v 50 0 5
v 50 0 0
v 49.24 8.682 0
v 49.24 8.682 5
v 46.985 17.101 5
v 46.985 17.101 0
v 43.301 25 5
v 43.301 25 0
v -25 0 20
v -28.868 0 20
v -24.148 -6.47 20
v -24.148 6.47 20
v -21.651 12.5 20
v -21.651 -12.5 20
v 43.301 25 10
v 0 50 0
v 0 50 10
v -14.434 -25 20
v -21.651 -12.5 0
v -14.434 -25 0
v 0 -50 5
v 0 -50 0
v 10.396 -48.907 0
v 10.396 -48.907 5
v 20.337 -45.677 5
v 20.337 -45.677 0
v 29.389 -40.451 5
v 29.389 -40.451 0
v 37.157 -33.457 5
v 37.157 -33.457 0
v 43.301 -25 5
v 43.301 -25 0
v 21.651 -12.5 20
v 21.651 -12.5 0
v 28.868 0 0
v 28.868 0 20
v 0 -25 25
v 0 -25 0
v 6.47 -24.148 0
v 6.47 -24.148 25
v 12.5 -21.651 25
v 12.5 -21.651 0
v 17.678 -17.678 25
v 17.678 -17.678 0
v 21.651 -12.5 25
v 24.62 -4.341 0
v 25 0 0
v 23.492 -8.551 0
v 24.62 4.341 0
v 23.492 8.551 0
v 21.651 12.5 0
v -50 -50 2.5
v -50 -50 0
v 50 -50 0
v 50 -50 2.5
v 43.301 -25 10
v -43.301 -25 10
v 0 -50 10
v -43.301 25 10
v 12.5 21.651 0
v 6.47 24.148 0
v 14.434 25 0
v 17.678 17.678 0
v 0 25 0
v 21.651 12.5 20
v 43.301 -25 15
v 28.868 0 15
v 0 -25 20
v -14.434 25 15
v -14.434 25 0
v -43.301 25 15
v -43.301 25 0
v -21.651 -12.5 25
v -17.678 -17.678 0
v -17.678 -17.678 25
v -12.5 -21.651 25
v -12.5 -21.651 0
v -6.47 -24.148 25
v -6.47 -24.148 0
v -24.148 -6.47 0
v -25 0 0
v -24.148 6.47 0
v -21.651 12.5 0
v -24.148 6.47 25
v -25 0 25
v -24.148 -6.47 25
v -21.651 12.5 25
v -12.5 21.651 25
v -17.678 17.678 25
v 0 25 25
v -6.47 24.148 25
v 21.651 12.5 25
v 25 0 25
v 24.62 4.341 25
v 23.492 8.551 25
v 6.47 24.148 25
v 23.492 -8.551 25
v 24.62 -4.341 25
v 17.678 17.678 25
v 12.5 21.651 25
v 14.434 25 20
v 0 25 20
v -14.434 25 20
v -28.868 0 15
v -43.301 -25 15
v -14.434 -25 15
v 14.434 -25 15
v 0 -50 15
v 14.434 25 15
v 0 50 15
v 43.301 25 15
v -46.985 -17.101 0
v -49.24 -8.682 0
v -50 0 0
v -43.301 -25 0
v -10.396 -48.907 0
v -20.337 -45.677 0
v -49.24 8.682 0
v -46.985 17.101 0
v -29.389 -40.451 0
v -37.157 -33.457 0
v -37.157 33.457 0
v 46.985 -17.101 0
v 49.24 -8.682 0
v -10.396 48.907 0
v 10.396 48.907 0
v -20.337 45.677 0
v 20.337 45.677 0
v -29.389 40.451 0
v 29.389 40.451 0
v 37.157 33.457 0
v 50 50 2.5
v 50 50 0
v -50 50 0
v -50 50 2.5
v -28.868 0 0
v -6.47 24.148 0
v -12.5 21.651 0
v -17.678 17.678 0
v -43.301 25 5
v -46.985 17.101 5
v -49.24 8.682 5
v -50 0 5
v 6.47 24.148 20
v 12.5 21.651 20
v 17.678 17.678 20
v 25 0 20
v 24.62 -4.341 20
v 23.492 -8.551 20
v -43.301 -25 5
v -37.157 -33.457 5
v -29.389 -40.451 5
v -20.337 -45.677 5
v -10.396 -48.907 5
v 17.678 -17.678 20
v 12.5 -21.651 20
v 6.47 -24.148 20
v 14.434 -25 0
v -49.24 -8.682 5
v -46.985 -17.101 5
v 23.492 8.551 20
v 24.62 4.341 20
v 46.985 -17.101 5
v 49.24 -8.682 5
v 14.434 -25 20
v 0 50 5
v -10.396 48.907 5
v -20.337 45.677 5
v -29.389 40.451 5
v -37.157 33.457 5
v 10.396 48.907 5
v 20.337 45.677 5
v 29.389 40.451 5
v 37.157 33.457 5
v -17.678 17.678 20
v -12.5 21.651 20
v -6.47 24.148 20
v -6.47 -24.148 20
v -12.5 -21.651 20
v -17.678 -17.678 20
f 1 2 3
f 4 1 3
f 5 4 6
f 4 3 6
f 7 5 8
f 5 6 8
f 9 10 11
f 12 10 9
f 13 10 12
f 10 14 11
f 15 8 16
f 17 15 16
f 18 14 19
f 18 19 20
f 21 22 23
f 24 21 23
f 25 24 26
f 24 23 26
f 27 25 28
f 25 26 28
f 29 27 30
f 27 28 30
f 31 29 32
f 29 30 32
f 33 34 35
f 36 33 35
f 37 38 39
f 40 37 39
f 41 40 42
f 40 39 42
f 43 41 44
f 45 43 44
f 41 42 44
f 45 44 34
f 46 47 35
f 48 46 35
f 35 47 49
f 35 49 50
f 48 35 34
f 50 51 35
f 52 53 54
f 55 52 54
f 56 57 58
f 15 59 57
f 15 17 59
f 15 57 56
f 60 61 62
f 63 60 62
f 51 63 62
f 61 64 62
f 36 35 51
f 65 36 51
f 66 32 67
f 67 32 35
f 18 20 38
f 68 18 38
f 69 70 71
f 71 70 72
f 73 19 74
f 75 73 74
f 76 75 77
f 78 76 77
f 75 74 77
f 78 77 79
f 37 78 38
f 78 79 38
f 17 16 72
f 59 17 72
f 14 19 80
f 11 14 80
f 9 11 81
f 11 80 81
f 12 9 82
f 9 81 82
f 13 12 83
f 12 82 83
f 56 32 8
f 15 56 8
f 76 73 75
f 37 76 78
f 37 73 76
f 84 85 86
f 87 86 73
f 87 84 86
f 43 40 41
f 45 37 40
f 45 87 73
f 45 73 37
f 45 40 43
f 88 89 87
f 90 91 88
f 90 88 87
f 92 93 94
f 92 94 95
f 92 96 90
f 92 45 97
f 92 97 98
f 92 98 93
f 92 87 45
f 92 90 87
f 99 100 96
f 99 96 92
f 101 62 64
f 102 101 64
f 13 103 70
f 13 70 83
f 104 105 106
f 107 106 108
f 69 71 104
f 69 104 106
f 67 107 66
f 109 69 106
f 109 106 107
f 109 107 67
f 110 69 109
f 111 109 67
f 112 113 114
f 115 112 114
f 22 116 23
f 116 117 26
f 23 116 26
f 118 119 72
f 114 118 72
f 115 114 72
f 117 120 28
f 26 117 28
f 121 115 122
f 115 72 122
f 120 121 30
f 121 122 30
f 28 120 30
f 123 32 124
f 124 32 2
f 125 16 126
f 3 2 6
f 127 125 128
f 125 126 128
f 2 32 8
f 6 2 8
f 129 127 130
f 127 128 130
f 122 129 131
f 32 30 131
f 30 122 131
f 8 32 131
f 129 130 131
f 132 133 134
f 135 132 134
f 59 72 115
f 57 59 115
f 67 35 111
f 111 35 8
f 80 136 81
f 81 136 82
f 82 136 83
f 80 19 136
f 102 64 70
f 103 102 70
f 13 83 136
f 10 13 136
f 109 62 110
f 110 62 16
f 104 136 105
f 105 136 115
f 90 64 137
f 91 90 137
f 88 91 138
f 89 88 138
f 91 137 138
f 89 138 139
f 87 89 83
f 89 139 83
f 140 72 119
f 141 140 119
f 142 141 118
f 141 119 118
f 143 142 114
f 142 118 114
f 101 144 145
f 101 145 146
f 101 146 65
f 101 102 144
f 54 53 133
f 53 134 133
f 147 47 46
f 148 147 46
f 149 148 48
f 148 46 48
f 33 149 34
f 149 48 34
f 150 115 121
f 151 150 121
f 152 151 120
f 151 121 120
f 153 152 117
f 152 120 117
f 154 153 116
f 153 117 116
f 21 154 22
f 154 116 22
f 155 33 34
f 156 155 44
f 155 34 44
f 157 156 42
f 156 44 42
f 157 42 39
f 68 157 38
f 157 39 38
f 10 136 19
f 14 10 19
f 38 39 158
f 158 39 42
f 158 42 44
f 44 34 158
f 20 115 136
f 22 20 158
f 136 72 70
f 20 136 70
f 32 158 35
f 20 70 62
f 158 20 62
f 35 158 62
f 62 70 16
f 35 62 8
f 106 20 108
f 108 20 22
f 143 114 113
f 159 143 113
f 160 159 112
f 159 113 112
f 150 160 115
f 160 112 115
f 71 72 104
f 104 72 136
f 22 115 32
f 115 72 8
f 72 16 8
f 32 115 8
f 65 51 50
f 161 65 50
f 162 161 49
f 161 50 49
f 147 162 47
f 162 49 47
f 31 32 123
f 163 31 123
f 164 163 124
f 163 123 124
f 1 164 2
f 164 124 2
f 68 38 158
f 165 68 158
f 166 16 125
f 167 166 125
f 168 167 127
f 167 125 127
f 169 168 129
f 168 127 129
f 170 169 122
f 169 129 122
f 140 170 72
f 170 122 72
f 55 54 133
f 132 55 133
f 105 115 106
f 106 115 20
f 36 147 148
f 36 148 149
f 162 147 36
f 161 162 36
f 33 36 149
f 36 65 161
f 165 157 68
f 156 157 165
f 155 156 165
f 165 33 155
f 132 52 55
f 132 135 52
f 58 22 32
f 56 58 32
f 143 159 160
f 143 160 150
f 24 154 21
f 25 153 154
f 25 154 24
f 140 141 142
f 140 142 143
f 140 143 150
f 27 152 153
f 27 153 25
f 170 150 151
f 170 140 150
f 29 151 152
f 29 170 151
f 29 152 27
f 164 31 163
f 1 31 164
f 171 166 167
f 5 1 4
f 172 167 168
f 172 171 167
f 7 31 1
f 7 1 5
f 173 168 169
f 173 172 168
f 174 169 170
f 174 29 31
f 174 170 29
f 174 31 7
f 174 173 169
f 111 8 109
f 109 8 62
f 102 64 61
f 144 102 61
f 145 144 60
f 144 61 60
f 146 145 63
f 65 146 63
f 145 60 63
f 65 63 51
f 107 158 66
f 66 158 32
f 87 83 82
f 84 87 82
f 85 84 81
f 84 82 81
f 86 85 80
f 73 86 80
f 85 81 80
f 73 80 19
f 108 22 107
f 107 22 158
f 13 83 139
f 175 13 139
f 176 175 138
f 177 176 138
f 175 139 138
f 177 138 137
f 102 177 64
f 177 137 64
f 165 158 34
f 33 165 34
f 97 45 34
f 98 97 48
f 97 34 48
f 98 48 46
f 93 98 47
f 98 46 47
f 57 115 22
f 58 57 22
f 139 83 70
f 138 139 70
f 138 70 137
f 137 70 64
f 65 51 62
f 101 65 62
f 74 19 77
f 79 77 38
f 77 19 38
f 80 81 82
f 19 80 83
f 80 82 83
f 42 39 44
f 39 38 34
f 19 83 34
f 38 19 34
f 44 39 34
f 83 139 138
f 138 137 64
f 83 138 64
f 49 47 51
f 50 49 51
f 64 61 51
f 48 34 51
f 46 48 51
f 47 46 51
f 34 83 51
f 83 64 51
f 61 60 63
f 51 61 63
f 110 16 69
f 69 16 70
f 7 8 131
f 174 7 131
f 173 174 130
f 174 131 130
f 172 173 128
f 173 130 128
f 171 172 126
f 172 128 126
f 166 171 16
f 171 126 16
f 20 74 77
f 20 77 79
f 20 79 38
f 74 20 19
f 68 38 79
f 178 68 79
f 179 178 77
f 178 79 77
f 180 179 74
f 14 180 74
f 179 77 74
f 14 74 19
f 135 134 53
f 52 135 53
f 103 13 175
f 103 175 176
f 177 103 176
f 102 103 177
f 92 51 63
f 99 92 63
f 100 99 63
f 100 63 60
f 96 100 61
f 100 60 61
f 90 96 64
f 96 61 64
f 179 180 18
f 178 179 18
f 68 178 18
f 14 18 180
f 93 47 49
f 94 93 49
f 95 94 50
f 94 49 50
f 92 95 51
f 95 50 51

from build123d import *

# Parameters (mm, degrees)
F1_DEPTH = 25
F2_DEPTH = 20
F3_DEPTH = 15
F4_DEPTH = 10
F5_DEPTH = 5
F6_DEPTH = 2.5


with BuildPart() as f1:
    # F0 (on Top) → F1 (new body)
    with BuildSketch(Plane.XY):
        with BuildLine():
            ThreePointArc((25, 0), (24.148145622, 6.4704762591), (21.6506349584, 12.5000002359))
            ThreePointArc((21.6506349584, 12.5000002359), (12.4999998821, 21.6506351627), (0, 25))
            ThreePointArc((0, 25), (-12.4999999326, 21.6506351336), (-21.6506350167, 12.5000001349))
            ThreePointArc((-21.6506350167, 12.5000001349), (-25, 2.62e-08), (-21.6506350429, -12.5000000895))
            ThreePointArc((-21.6506350429, -12.5000000895), (-12.4999999395, -21.6506351296), (3.65e-08, -25))
            ThreePointArc((3.65e-08, -25), (12.4999998892, -21.6506351586), (21.6506349484, -12.5000002532))
            ThreePointArc((21.6506349484, -12.5000002532), (24.1481456194, -6.4704762687), (25, 0))
        make_face()
    extrude(amount=F1_DEPTH)


with BuildPart() as f2:
    # F0 (on Top) → F2 (new body)
    with BuildSketch(Plane.XY):
        with BuildLine():
            Line((0, 25), (-14.4337567297, 25))
            Line((-14.4337567297, 25), (-21.6506350167, 12.5000001349))
            ThreePointArc((-21.6506350167, 12.5000001349), (-12.4999999326, 21.6506351336), (0, 25))
        make_face()
    extrude(amount=F2_DEPTH)


with BuildPart() as f2b:
    # F0 (on Top) → F2, piece 2 (new body)
    with BuildSketch(Plane.XY):
        with BuildLine():
            Line((21.6506349484, -12.5000002532), (28.8675134595, 0))
            Line((28.8675134595, 0), (21.6506349584, 12.5000002359))
            ThreePointArc((21.6506349584, 12.5000002359), (24.148145622, 6.4704762591), (25, 0))
            ThreePointArc((25, 0), (24.1481456194, -6.4704762687), (21.6506349484, -12.5000002532))
        make_face()
    extrude(amount=F2_DEPTH)


with BuildPart() as f2c:
    # F0 (on Top) → F2, piece 3 (new body)
    with BuildSketch(Plane.XY):
        with BuildLine():
            Line((21.6506349584, 12.5000002359), (14.4337567297, 25))
            Line((14.4337567297, 25), (0, 25))
            ThreePointArc((0, 25), (12.4999998821, 21.6506351627), (21.6506349584, 12.5000002359))
        make_face()
    extrude(amount=F2_DEPTH)


with BuildPart() as f2d:
    # F0 (on Top) → F2, piece 4 (new body)
    with BuildSketch(Plane.XY):
        with BuildLine():
            Line((3.65e-08, -25), (14.4337567297, -25))
            Line((14.4337567297, -25), (21.6506349484, -12.5000002532))
            ThreePointArc((21.6506349484, -12.5000002532), (12.4999998892, -21.6506351586), (3.65e-08, -25))
        make_face()
    extrude(amount=F2_DEPTH)


with BuildPart() as f2e:
    # F0 (on Top) → F2, piece 5 (new body)
    with BuildSketch(Plane.XY):
        with BuildLine():
            Line((-21.6506350429, -12.5000000895), (-14.4337567297, -25))
            Line((-14.4337567297, -25), (3.65e-08, -25))
            ThreePointArc((3.65e-08, -25), (-12.4999999395, -21.6506351296), (-21.6506350429, -12.5000000895))
        make_face()
    extrude(amount=F2_DEPTH)


with BuildPart() as f2f:
    # F0 (on Top) → F2, piece 6 (new body)
    with BuildSketch(Plane.XY):
        with BuildLine():
            Line((-21.6506350167, 12.5000001349), (-28.8675134595, 0))
            Line((-28.8675134595, 0), (-21.6506350429, -12.5000000895))
            ThreePointArc((-21.6506350429, -12.5000000895), (-25, 2.62e-08), (-21.6506350167, 12.5000001349))
        make_face()
    extrude(amount=F2_DEPTH)


with BuildPart() as f3:
    # F0 (on Top) → F3 (new body)
    with BuildSketch(Plane.XY):
        Polygon((14.4337567297, 25), (0, 50), (-14.4337567297, 25), (0, 25), align=None)
        Polygon((28.8675134595, 0), (43.3012701892, 25), (14.4337567297, 25), (21.6506349584, 12.5000002359), align=None)
        Polygon((14.4337567297, -25), (43.3012701892, -25), (28.8675134595, 0), (21.6506349484, -12.5000002532), align=None)
        Polygon((-14.4337567297, -25), (0, -50), (14.4337567297, -25), (3.65e-08, -25), align=None)
        Polygon((-28.8675134595, 0), (-43.3012701892, -25), (-14.4337567297, -25), (-21.6506350429, -12.5000000895), align=None)
        Polygon((-14.4337567297, 25), (-43.3012701892, 25), (-28.8675134595, 0), (-21.6506350167, 12.5000001349), align=None)
        with BuildLine():
            Line((0, 25), (-14.4337567297, 25))
            Line((-14.4337567297, 25), (-21.6506350167, 12.5000001349))
            ThreePointArc((-21.6506350167, 12.5000001349), (-12.4999999326, 21.6506351336), (0, 25))
        make_face()
        with BuildLine():
            Line((21.6506349584, 12.5000002359), (14.4337567297, 25))
            Line((14.4337567297, 25), (0, 25))
            ThreePointArc((0, 25), (12.4999998821, 21.6506351627), (21.6506349584, 12.5000002359))
        make_face()
        with BuildLine():
            Line((21.6506349484, -12.5000002532), (28.8675134595, 0))
            Line((28.8675134595, 0), (21.6506349584, 12.5000002359))
            ThreePointArc((21.6506349584, 12.5000002359), (24.148145622, 6.4704762591), (25, 0))
            ThreePointArc((25, 0), (24.1481456194, -6.4704762687), (21.6506349484, -12.5000002532))
        make_face()
        with BuildLine():
            Line((3.65e-08, -25), (14.4337567297, -25))
            Line((14.4337567297, -25), (21.6506349484, -12.5000002532))
            ThreePointArc((21.6506349484, -12.5000002532), (12.4999998892, -21.6506351586), (3.65e-08, -25))
        make_face()
        with BuildLine():
            Line((-21.6506350429, -12.5000000895), (-14.4337567297, -25))
            Line((-14.4337567297, -25), (3.65e-08, -25))
            ThreePointArc((3.65e-08, -25), (-12.4999999395, -21.6506351296), (-21.6506350429, -12.5000000895))
        make_face()
        with BuildLine():
            Line((-21.6506350167, 12.5000001349), (-28.8675134595, 0))
            Line((-28.8675134595, 0), (-21.6506350429, -12.5000000895))
            ThreePointArc((-21.6506350429, -12.5000000895), (-25, 2.62e-08), (-21.6506350167, 12.5000001349))
        make_face()
        with BuildLine():
            ThreePointArc((25, 0), (24.148145622, 6.4704762591), (21.6506349584, 12.5000002359))
            ThreePointArc((21.6506349584, 12.5000002359), (12.4999998821, 21.6506351627), (0, 25))
            ThreePointArc((0, 25), (-12.4999999326, 21.6506351336), (-21.6506350167, 12.5000001349))
            ThreePointArc((-21.6506350167, 12.5000001349), (-25, 2.62e-08), (-21.6506350429, -12.5000000895))
            ThreePointArc((-21.6506350429, -12.5000000895), (-12.4999999395, -21.6506351296), (3.65e-08, -25))
            ThreePointArc((3.65e-08, -25), (12.4999998892, -21.6506351586), (21.6506349484, -12.5000002532))
            ThreePointArc((21.6506349484, -12.5000002532), (24.1481456194, -6.4704762687), (25, 0))
        make_face()
    extrude(amount=F3_DEPTH)


with BuildPart() as f4:
    # F0 (on Top) → F4 (new body)
    with BuildSketch(Plane.XY):
        Polygon((-14.4337567297, 25), (0, 50), (-43.3012701892, 25), align=None)
        Polygon((14.4337567297, 25), (43.3012701892, 25), (0, 50), align=None)
        Polygon((43.3012701892, -25), (43.3012701892, 25), (28.8675134595, 0), align=None)
        Polygon((0, -50), (43.3012701892, -25), (14.4337567297, -25), align=None)
        Polygon((-43.3012701892, -25), (0, -50), (-14.4337567297, -25), align=None)
        Polygon((-28.8675134595, 0), (-43.3012701892, 25), (-43.3012701892, -25), align=None)
        Polygon((-14.4337567297, 25), (-43.3012701892, 25), (-28.8675134595, 0), (-21.6506350167, 12.5000001349), align=None)
        Polygon((14.4337567297, 25), (0, 50), (-14.4337567297, 25), (0, 25), align=None)
        Polygon((28.8675134595, 0), (43.3012701892, 25), (14.4337567297, 25), (21.6506349584, 12.5000002359), align=None)
        Polygon((14.4337567297, -25), (43.3012701892, -25), (28.8675134595, 0), (21.6506349484, -12.5000002532), align=None)
        Polygon((-14.4337567297, -25), (0, -50), (14.4337567297, -25), (3.65e-08, -25), align=None)
        Polygon((-28.8675134595, 0), (-43.3012701892, -25), (-14.4337567297, -25), (-21.6506350429, -12.5000000895), align=None)
        with BuildLine():
            Line((-21.6506350167, 12.5000001349), (-28.8675134595, 0))
            Line((-28.8675134595, 0), (-21.6506350429, -12.5000000895))
            ThreePointArc((-21.6506350429, -12.5000000895), (-25, 2.62e-08), (-21.6506350167, 12.5000001349))
        make_face()
        with BuildLine():
            Line((0, 25), (-14.4337567297, 25))
            Line((-14.4337567297, 25), (-21.6506350167, 12.5000001349))
            ThreePointArc((-21.6506350167, 12.5000001349), (-12.4999999326, 21.6506351336), (0, 25))
        make_face()
        with BuildLine():
            Line((21.6506349584, 12.5000002359), (14.4337567297, 25))
            Line((14.4337567297, 25), (0, 25))
            ThreePointArc((0, 25), (12.4999998821, 21.6506351627), (21.6506349584, 12.5000002359))
        make_face()
        with BuildLine():
            Line((21.6506349484, -12.5000002532), (28.8675134595, 0))
            Line((28.8675134595, 0), (21.6506349584, 12.5000002359))
            ThreePointArc((21.6506349584, 12.5000002359), (24.148145622, 6.4704762591), (25, 0))
            ThreePointArc((25, 0), (24.1481456194, -6.4704762687), (21.6506349484, -12.5000002532))
        make_face()
        with BuildLine():
            Line((3.65e-08, -25), (14.4337567297, -25))
            Line((14.4337567297, -25), (21.6506349484, -12.5000002532))
            ThreePointArc((21.6506349484, -12.5000002532), (12.4999998892, -21.6506351586), (3.65e-08, -25))
        make_face()
        with BuildLine():
            Line((-21.6506350429, -12.5000000895), (-14.4337567297, -25))
            Line((-14.4337567297, -25), (3.65e-08, -25))
            ThreePointArc((3.65e-08, -25), (-12.4999999395, -21.6506351296), (-21.6506350429, -12.5000000895))
        make_face()
        with BuildLine():
            ThreePointArc((25, 0), (24.148145622, 6.4704762591), (21.6506349584, 12.5000002359))
            ThreePointArc((21.6506349584, 12.5000002359), (12.4999998821, 21.6506351627), (0, 25))
            ThreePointArc((0, 25), (-12.4999999326, 21.6506351336), (-21.6506350167, 12.5000001349))
            ThreePointArc((-21.6506350167, 12.5000001349), (-25, 2.62e-08), (-21.6506350429, -12.5000000895))
            ThreePointArc((-21.6506350429, -12.5000000895), (-12.4999999395, -21.6506351296), (3.65e-08, -25))
            ThreePointArc((3.65e-08, -25), (12.4999998892, -21.6506351586), (21.6506349484, -12.5000002532))
            ThreePointArc((21.6506349484, -12.5000002532), (24.1481456194, -6.4704762687), (25, 0))
        make_face()
    extrude(amount=F4_DEPTH)


with BuildPart() as f5:
    # F0 (on Top) → F5 (new body)
    with BuildSketch(Plane.XY):
        with BuildLine():
            Line((-43.3012701892, 25), (0, 50))
            ThreePointArc((0, 50), (-25, 43.3012701892), (-43.3012701892, 25))
        make_face()
        with BuildLine():
            Line((0, 50), (43.3012701892, 25))
            ThreePointArc((43.3012701892, 25), (25, 43.3012701892), (0, 50))
        make_face()
        with BuildLine():
            ThreePointArc((43.3012701892, -25), (48.2962913145, -12.9409522551), (50, 0))
            ThreePointArc((50, 0), (48.2962913145, 12.9409522551), (43.3012701892, 25))
            Line((43.3012701892, 25), (43.3012701892, -25))
        make_face()
        with BuildLine():
            ThreePointArc((0, -50), (25, -43.3012701892), (43.3012701892, -25))
            Line((43.3012701892, -25), (0, -50))
        make_face()
        with BuildLine():
            ThreePointArc((-43.3012701892, -25), (-25, -43.3012701892), (0, -50))
            Line((0, -50), (-43.3012701892, -25))
        make_face()
        with BuildLine():
            Line((-43.3012701892, -25), (-43.3012701892, 25))
            ThreePointArc((-43.3012701892, 25), (-48.2962913145, 12.9409522551), (-50, 0))
            ThreePointArc((-50, 0), (-48.2962913145, -12.9409522551), (-43.3012701892, -25))
        make_face()
        Polygon((-14.4337567297, 25), (0, 50), (-43.3012701892, 25), align=None)
        Polygon((14.4337567297, 25), (43.3012701892, 25), (0, 50), align=None)
        Polygon((43.3012701892, -25), (43.3012701892, 25), (28.8675134595, 0), align=None)
        Polygon((0, -50), (43.3012701892, -25), (14.4337567297, -25), align=None)
        Polygon((-43.3012701892, -25), (0, -50), (-14.4337567297, -25), align=None)
        Polygon((-28.8675134595, 0), (-43.3012701892, 25), (-43.3012701892, -25), align=None)
        Polygon((14.4337567297, 25), (0, 50), (-14.4337567297, 25), (0, 25), align=None)
        Polygon((28.8675134595, 0), (43.3012701892, 25), (14.4337567297, 25), (21.6506349584, 12.5000002359), align=None)
        Polygon((14.4337567297, -25), (43.3012701892, -25), (28.8675134595, 0), (21.6506349484, -12.5000002532), align=None)
        Polygon((-14.4337567297, -25), (0, -50), (14.4337567297, -25), (3.65e-08, -25), align=None)
        Polygon((-28.8675134595, 0), (-43.3012701892, -25), (-14.4337567297, -25), (-21.6506350429, -12.5000000895), align=None)
        Polygon((-14.4337567297, 25), (-43.3012701892, 25), (-28.8675134595, 0), (-21.6506350167, 12.5000001349), align=None)
        with BuildLine():
            Line((0, 25), (-14.4337567297, 25))
            Line((-14.4337567297, 25), (-21.6506350167, 12.5000001349))
            ThreePointArc((-21.6506350167, 12.5000001349), (-12.4999999326, 21.6506351336), (0, 25))
        make_face()
        with BuildLine():
            Line((21.6506349584, 12.5000002359), (14.4337567297, 25))
            Line((14.4337567297, 25), (0, 25))
            ThreePointArc((0, 25), (12.4999998821, 21.6506351627), (21.6506349584, 12.5000002359))
        make_face()
        with BuildLine():
            Line((21.6506349484, -12.5000002532), (28.8675134595, 0))
            Line((28.8675134595, 0), (21.6506349584, 12.5000002359))
            ThreePointArc((21.6506349584, 12.5000002359), (24.148145622, 6.4704762591), (25, 0))
            ThreePointArc((25, 0), (24.1481456194, -6.4704762687), (21.6506349484, -12.5000002532))
        make_face()
        with BuildLine():
            Line((3.65e-08, -25), (14.4337567297, -25))
            Line((14.4337567297, -25), (21.6506349484, -12.5000002532))
            ThreePointArc((21.6506349484, -12.5000002532), (12.4999998892, -21.6506351586), (3.65e-08, -25))
        make_face()
        with BuildLine():
            Line((-21.6506350429, -12.5000000895), (-14.4337567297, -25))
            Line((-14.4337567297, -25), (3.65e-08, -25))
            ThreePointArc((3.65e-08, -25), (-12.4999999395, -21.6506351296), (-21.6506350429, -12.5000000895))
        make_face()
        with BuildLine():
            Line((-21.6506350167, 12.5000001349), (-28.8675134595, 0))
            Line((-28.8675134595, 0), (-21.6506350429, -12.5000000895))
            ThreePointArc((-21.6506350429, -12.5000000895), (-25, 2.62e-08), (-21.6506350167, 12.5000001349))
        make_face()
        with BuildLine():
            ThreePointArc((25, 0), (24.148145622, 6.4704762591), (21.6506349584, 12.5000002359))
            ThreePointArc((21.6506349584, 12.5000002359), (12.4999998821, 21.6506351627), (0, 25))
            ThreePointArc((0, 25), (-12.4999999326, 21.6506351336), (-21.6506350167, 12.5000001349))
            ThreePointArc((-21.6506350167, 12.5000001349), (-25, 2.62e-08), (-21.6506350429, -12.5000000895))
            ThreePointArc((-21.6506350429, -12.5000000895), (-12.4999999395, -21.6506351296), (3.65e-08, -25))
            ThreePointArc((3.65e-08, -25), (12.4999998892, -21.6506351586), (21.6506349484, -12.5000002532))
            ThreePointArc((21.6506349484, -12.5000002532), (24.1481456194, -6.4704762687), (25, 0))
        make_face()
    extrude(amount=F5_DEPTH)


with BuildPart() as f6:
    # F0 (on Top) → F6 (new body)
    with BuildSketch(Plane.XY):
        with BuildLine():
            ThreePointArc((-43.3012701892, 25), (-25, 43.3012701892), (0, 50))
            Line((0, 50), (-50, 50))
            Line((-50, 50), (-50, 0))
            ThreePointArc((-50, 0), (-48.2962913145, 12.9409522551), (-43.3012701892, 25))
        make_face()
        with BuildLine():
            ThreePointArc((43.3012701892, 25), (48.2962913145, 12.9409522551), (50, 0))
            Line((50, 0), (50, 50))
            Line((50, 50), (0, 50))
            ThreePointArc((0, 50), (25, 43.3012701892), (43.3012701892, 25))
        make_face()
        with BuildLine():
            Line((50, -50), (50, 0))
            ThreePointArc((50, 0), (48.2962913145, -12.9409522551), (43.3012701892, -25))
            ThreePointArc((43.3012701892, -25), (25, -43.3012701892), (0, -50))
            Line((0, -50), (50, -50))
        make_face()
        with BuildLine():
            Line((-50, -50), (0, -50))
            ThreePointArc((0, -50), (-25, -43.3012701892), (-43.3012701892, -25))
            ThreePointArc((-43.3012701892, -25), (-48.2962913145, -12.9409522551), (-50, 0))
            Line((-50, 0), (-50, -50))
        make_face()
        with BuildLine():
            Line((-43.3012701892, 25), (0, 50))
            ThreePointArc((0, 50), (-25, 43.3012701892), (-43.3012701892, 25))
        make_face()
        with BuildLine():
            Line((0, 50), (43.3012701892, 25))
            ThreePointArc((43.3012701892, 25), (25, 43.3012701892), (0, 50))
        make_face()
        with BuildLine():
            ThreePointArc((43.3012701892, -25), (48.2962913145, -12.9409522551), (50, 0))
            ThreePointArc((50, 0), (48.2962913145, 12.9409522551), (43.3012701892, 25))
            Line((43.3012701892, 25), (43.3012701892, -25))
        make_face()
        with BuildLine():
            ThreePointArc((0, -50), (25, -43.3012701892), (43.3012701892, -25))
            Line((43.3012701892, -25), (0, -50))
        make_face()
        with BuildLine():
            ThreePointArc((-43.3012701892, -25), (-25, -43.3012701892), (0, -50))
            Line((0, -50), (-43.3012701892, -25))
        make_face()
        with BuildLine():
            Line((-43.3012701892, -25), (-43.3012701892, 25))
            ThreePointArc((-43.3012701892, 25), (-48.2962913145, 12.9409522551), (-50, 0))
            ThreePointArc((-50, 0), (-48.2962913145, -12.9409522551), (-43.3012701892, -25))
        make_face()
        Polygon((-14.4337567297, 25), (0, 50), (-43.3012701892, 25), align=None)
        Polygon((14.4337567297, 25), (43.3012701892, 25), (0, 50), align=None)
        Polygon((43.3012701892, -25), (43.3012701892, 25), (28.8675134595, 0), align=None)
        Polygon((0, -50), (43.3012701892, -25), (14.4337567297, -25), align=None)
        Polygon((-43.3012701892, -25), (0, -50), (-14.4337567297, -25), align=None)
        Polygon((-28.8675134595, 0), (-43.3012701892, 25), (-43.3012701892, -25), align=None)
        Polygon((14.4337567297, 25), (0, 50), (-14.4337567297, 25), (0, 25), align=None)
        Polygon((28.8675134595, 0), (43.3012701892, 25), (14.4337567297, 25), (21.6506349584, 12.5000002359), align=None)
        Polygon((14.4337567297, -25), (43.3012701892, -25), (28.8675134595, 0), (21.6506349484, -12.5000002532), align=None)
        Polygon((-14.4337567297, -25), (0, -50), (14.4337567297, -25), (3.65e-08, -25), align=None)
        Polygon((-28.8675134595, 0), (-43.3012701892, -25), (-14.4337567297, -25), (-21.6506350429, -12.5000000895), align=None)
        Polygon((-14.4337567297, 25), (-43.3012701892, 25), (-28.8675134595, 0), (-21.6506350167, 12.5000001349), align=None)
        with BuildLine():
            Line((0, 25), (-14.4337567297, 25))
            Line((-14.4337567297, 25), (-21.6506350167, 12.5000001349))
            ThreePointArc((-21.6506350167, 12.5000001349), (-12.4999999326, 21.6506351336), (0, 25))
        make_face()
        with BuildLine():
            Line((21.6506349584, 12.5000002359), (14.4337567297, 25))
            Line((14.4337567297, 25), (0, 25))
            ThreePointArc((0, 25), (12.4999998821, 21.6506351627), (21.6506349584, 12.5000002359))
        make_face()
        with BuildLine():
            Line((21.6506349484, -12.5000002532), (28.8675134595, 0))
            Line((28.8675134595, 0), (21.6506349584, 12.5000002359))
            ThreePointArc((21.6506349584, 12.5000002359), (24.148145622, 6.4704762591), (25, 0))
            ThreePointArc((25, 0), (24.1481456194, -6.4704762687), (21.6506349484, -12.5000002532))
        make_face()
        with BuildLine():
            Line((3.65e-08, -25), (14.4337567297, -25))
            Line((14.4337567297, -25), (21.6506349484, -12.5000002532))
            ThreePointArc((21.6506349484, -12.5000002532), (12.4999998892, -21.6506351586), (3.65e-08, -25))
        make_face()
        with BuildLine():
            Line((-21.6506350429, -12.5000000895), (-14.4337567297, -25))
            Line((-14.4337567297, -25), (3.65e-08, -25))
            ThreePointArc((3.65e-08, -25), (-12.4999999395, -21.6506351296), (-21.6506350429, -12.5000000895))
        make_face()
        with BuildLine():
            Line((-21.6506350167, 12.5000001349), (-28.8675134595, 0))
            Line((-28.8675134595, 0), (-21.6506350429, -12.5000000895))
            ThreePointArc((-21.6506350429, -12.5000000895), (-25, 2.62e-08), (-21.6506350167, 12.5000001349))
        make_face()
        with BuildLine():
            ThreePointArc((25, 0), (24.148145622, 6.4704762591), (21.6506349584, 12.5000002359))
            ThreePointArc((21.6506349584, 12.5000002359), (12.4999998821, 21.6506351627), (0, 25))
            ThreePointArc((0, 25), (-12.4999999326, 21.6506351336), (-21.6506350167, 12.5000001349))
            ThreePointArc((-21.6506350167, 12.5000001349), (-25, 2.62e-08), (-21.6506350429, -12.5000000895))
            ThreePointArc((-21.6506350429, -12.5000000895), (-12.4999999395, -21.6506351296), (3.65e-08, -25))
            ThreePointArc((3.65e-08, -25), (12.4999998892, -21.6506351586), (21.6506349484, -12.5000002532))
            ThreePointArc((21.6506349484, -12.5000002532), (24.1481456194, -6.4704762687), (25, 0))
        make_face()
    extrude(amount=F6_DEPTH)


solid = Compound([f1.part, f2.part, f2b.part, f2c.part, f2d.part, f2e.part, f2f.part, f3.part, f4.part, f5.part, f6.part])
